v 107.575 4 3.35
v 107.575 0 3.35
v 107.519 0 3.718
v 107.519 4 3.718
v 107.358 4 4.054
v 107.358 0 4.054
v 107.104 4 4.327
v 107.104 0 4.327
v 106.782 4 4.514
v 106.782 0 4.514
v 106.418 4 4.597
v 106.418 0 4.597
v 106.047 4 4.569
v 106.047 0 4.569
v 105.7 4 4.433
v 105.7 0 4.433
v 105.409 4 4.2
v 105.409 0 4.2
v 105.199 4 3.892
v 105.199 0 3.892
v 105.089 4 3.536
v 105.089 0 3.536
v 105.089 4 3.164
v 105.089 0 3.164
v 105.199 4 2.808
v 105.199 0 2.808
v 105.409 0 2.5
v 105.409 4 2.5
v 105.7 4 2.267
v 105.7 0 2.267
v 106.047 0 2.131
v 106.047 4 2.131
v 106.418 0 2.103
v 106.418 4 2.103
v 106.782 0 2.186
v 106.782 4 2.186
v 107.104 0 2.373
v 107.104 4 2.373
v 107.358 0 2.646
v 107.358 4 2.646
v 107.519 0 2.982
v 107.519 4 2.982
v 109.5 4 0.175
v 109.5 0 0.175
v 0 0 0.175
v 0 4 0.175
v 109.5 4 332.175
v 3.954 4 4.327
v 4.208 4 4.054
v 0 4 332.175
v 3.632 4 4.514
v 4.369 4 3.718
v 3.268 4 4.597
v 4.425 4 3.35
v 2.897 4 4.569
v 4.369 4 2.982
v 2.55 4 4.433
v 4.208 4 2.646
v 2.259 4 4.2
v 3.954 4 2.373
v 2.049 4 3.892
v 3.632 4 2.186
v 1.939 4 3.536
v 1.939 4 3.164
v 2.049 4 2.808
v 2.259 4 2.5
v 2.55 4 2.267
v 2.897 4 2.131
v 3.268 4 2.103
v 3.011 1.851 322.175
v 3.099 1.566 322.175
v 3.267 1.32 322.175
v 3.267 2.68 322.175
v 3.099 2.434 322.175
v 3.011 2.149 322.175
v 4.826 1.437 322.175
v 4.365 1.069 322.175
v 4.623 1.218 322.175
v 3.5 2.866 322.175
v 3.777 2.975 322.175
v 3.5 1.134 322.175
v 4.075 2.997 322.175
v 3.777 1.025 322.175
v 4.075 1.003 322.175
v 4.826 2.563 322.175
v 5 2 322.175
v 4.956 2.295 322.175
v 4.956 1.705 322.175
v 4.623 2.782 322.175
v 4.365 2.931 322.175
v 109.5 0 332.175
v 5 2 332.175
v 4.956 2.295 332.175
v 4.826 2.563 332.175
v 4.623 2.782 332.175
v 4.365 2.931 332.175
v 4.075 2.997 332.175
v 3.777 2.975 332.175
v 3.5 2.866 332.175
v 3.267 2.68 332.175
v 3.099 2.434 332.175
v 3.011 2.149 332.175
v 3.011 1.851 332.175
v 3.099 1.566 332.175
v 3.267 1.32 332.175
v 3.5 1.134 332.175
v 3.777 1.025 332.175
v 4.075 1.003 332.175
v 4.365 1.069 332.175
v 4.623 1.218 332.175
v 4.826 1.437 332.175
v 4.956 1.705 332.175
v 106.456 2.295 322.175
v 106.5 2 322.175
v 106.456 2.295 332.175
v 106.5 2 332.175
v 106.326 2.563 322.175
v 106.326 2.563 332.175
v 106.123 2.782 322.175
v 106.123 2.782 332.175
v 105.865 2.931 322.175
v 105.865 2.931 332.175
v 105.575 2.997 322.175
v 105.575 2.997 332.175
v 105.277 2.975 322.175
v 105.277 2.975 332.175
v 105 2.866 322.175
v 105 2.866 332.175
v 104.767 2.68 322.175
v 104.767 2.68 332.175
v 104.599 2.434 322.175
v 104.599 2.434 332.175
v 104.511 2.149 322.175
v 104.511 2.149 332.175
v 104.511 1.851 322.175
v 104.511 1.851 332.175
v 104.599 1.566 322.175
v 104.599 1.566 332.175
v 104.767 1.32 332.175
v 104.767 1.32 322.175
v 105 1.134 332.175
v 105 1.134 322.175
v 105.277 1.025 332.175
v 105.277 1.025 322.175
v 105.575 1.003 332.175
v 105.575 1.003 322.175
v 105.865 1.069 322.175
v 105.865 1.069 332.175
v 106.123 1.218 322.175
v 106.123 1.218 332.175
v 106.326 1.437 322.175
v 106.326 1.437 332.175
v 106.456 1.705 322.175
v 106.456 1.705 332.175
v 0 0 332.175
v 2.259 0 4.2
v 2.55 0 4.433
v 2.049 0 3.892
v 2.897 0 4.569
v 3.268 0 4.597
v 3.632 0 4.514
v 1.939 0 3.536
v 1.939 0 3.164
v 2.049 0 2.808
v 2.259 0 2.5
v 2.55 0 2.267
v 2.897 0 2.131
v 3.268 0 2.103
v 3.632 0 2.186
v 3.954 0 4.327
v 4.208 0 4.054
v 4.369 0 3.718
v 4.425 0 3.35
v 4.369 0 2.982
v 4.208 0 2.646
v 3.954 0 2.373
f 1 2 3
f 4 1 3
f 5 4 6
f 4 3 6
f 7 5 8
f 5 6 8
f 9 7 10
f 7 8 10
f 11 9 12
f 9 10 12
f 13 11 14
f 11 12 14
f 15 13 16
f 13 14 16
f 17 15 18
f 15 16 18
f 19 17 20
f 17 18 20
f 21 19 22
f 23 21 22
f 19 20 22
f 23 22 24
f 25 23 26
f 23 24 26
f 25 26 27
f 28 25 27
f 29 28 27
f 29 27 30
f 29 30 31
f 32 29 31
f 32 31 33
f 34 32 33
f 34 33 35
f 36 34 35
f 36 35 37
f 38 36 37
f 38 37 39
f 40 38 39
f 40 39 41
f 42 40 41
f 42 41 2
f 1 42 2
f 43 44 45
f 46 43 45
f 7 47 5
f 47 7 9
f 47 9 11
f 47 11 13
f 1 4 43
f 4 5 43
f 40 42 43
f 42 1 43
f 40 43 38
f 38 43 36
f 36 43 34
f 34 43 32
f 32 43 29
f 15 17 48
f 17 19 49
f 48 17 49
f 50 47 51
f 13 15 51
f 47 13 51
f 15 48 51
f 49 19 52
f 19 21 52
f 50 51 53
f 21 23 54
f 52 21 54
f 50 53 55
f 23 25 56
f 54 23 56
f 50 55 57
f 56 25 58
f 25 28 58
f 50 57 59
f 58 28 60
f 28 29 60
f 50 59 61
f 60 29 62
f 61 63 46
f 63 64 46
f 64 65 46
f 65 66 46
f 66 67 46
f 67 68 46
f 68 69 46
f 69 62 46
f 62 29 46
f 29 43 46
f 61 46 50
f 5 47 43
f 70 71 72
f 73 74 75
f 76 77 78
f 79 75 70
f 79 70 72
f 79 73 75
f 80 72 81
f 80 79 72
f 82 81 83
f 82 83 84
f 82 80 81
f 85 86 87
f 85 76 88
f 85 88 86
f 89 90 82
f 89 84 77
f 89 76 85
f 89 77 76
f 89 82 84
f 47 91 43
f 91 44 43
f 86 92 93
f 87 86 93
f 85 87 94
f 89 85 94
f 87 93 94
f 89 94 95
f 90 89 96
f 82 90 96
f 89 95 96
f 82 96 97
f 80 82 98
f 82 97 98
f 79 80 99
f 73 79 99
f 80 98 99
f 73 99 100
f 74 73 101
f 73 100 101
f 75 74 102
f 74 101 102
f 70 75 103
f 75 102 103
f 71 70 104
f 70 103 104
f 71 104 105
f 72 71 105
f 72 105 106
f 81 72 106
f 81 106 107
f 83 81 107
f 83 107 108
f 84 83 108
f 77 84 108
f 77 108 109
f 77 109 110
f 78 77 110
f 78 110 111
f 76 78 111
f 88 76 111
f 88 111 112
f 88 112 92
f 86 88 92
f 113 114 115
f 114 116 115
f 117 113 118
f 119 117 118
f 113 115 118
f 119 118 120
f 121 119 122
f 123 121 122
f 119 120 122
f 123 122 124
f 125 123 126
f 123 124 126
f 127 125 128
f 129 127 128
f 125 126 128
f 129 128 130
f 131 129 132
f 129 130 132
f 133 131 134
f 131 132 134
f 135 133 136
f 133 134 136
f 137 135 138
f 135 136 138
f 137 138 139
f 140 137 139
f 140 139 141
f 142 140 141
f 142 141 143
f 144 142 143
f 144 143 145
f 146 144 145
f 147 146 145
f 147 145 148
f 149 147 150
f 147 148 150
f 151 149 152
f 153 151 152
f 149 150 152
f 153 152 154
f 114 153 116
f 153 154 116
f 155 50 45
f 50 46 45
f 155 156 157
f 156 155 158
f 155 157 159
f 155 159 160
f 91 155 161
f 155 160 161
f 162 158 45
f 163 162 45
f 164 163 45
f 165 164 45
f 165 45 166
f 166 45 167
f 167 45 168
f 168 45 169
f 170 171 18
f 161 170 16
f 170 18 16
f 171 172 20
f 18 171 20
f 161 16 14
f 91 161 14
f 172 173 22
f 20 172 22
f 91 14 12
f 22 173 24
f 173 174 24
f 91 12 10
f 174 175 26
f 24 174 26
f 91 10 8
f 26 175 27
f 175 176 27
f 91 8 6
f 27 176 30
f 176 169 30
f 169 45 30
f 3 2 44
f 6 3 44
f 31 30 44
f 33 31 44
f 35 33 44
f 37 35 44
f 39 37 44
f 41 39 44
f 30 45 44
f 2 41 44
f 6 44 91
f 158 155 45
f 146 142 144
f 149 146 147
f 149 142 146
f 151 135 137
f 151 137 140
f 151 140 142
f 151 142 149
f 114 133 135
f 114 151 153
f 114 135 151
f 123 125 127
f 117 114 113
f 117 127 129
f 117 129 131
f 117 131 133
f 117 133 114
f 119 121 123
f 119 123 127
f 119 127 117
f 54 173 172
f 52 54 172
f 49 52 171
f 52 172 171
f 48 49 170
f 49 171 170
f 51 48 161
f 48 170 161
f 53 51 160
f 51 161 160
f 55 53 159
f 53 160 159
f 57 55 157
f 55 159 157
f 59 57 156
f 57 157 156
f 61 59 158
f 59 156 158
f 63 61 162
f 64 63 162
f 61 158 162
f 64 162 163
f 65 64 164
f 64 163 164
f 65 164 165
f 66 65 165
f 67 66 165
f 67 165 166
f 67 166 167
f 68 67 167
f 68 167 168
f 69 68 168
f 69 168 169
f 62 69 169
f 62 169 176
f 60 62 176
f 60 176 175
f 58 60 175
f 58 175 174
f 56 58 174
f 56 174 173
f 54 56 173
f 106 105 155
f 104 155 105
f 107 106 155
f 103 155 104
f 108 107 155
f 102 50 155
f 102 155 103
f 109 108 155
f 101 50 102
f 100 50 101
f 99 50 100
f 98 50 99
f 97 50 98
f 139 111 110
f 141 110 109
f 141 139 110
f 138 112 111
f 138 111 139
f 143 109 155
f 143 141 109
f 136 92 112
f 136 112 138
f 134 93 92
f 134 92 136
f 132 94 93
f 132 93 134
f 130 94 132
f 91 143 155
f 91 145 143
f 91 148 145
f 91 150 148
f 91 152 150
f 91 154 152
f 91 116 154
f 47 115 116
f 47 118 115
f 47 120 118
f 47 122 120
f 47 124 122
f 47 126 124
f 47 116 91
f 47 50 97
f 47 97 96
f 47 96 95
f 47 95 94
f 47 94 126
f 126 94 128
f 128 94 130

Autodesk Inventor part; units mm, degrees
ref_plane "YZ Plane" through (0, 0, 0) normal (1, 0, 0) x (0, 1, 0)
ref_plane "XZ Plane" through (0, 0, 0) normal (0, 1, 0) x (-1, 0, 0)
ref_plane "XY Plane" through (0, 0, 0) normal (0, 0, 1) x (1, 0, 0)
sketch "Sketch1" plane through (0, 0, 0) normal (0, 0, 1) x (1, 0, 0)
  line L0 (0, 0) -> (109.5, 0)
  line L1 (109.5, 0) -> (109.5, 4)
  line L2 (109.5, 4) -> (0, 4)
  line L3 (0, 4) -> (0, 0)
  dimension "d0" = 109.5
  dimension "d1" = 4
extrude "Extrusion1" add sketch "Sketch1" along normal blind 332.175
sketch "Sketch2" plane through (0, 0, 0) normal (0, -1, 0) x (1, 0, 0)
  line L0 (0, 0) -> (109.5, 0) projected
  line L1 (0, 0) -> (3.175, 0) construction
  line L2 (3.175, 0) -> (3.175, 3.175) construction
  line L3 (109.5, 0) -> (106.325, 0) construction
  line L4 (106.325, 0) -> (106.325, 3.175) construction
  line L5 (106.325, 3.175) -> (106.325, 3.35) construction
  circle A0 centre (106.325, 3.35) radius 1.25
  line L6 (3.175, 3.175) -> (3.175, 3.35) construction
  circle A1 centre (3.175, 3.35) radius 1.25
  dimension "d4" = 3.175
  dimension "d5" = 3.175
  dimension "d7" = 3.175
  dimension "d8" = 3.175
  dimension "d22" = 0.175
  dimension "d23" = 2.5
  dimension "d24" = 0.175
  dimension "d25" = 2.5
extrude "Extrusion2" cut sketch "Sketch2" against normal blind 10
sketch "Sketch3" plane through (0, 0, 332.175) normal (0, 0, 1) x (1, 0, 0)
  line L0 (0, 0) -> (109.5, 0) projected
  line L1 (109.5, 0) -> (109.5, 4) projected
  line L2 (0, 0) -> (4, 0) construction
  line L3 (4, 0) -> (4, 2) construction
  circle A0 centre (4, 2) radius 1
  line L4 (109.5, 2) -> (105.5, 2) construction
  circle A1 centre (105.5, 2) radius 1
  dimension "d12" = 4
  dimension "d13" = 2
  dimension "d14" = 2
  dimension "d15" = 4
  dimension "d16" = 2
extrude "Extrusion3" cut sketch "Sketch3" against normal blind 10
sketch "Sketch4" plane through (0, 0, 0) normal (0, -1, 0) x (1, 0, 0)
  line L0 (109.5, 0) -> (0, 0) projected
  line L1 (0, 0) -> (121.8919, 0)
  line L2 (121.8919, 0) -> (121.8919, 0.175)
  line L3 (121.8919, 0.175) -> (0, 0.175)
  line L4 (0, 0.175) -> (0, 0)
  dimension "d19" = 0.175
extrude "Extrusion4" cut sketch "Sketch4" against normal blind 10
properties part number "sideplate part 1"
